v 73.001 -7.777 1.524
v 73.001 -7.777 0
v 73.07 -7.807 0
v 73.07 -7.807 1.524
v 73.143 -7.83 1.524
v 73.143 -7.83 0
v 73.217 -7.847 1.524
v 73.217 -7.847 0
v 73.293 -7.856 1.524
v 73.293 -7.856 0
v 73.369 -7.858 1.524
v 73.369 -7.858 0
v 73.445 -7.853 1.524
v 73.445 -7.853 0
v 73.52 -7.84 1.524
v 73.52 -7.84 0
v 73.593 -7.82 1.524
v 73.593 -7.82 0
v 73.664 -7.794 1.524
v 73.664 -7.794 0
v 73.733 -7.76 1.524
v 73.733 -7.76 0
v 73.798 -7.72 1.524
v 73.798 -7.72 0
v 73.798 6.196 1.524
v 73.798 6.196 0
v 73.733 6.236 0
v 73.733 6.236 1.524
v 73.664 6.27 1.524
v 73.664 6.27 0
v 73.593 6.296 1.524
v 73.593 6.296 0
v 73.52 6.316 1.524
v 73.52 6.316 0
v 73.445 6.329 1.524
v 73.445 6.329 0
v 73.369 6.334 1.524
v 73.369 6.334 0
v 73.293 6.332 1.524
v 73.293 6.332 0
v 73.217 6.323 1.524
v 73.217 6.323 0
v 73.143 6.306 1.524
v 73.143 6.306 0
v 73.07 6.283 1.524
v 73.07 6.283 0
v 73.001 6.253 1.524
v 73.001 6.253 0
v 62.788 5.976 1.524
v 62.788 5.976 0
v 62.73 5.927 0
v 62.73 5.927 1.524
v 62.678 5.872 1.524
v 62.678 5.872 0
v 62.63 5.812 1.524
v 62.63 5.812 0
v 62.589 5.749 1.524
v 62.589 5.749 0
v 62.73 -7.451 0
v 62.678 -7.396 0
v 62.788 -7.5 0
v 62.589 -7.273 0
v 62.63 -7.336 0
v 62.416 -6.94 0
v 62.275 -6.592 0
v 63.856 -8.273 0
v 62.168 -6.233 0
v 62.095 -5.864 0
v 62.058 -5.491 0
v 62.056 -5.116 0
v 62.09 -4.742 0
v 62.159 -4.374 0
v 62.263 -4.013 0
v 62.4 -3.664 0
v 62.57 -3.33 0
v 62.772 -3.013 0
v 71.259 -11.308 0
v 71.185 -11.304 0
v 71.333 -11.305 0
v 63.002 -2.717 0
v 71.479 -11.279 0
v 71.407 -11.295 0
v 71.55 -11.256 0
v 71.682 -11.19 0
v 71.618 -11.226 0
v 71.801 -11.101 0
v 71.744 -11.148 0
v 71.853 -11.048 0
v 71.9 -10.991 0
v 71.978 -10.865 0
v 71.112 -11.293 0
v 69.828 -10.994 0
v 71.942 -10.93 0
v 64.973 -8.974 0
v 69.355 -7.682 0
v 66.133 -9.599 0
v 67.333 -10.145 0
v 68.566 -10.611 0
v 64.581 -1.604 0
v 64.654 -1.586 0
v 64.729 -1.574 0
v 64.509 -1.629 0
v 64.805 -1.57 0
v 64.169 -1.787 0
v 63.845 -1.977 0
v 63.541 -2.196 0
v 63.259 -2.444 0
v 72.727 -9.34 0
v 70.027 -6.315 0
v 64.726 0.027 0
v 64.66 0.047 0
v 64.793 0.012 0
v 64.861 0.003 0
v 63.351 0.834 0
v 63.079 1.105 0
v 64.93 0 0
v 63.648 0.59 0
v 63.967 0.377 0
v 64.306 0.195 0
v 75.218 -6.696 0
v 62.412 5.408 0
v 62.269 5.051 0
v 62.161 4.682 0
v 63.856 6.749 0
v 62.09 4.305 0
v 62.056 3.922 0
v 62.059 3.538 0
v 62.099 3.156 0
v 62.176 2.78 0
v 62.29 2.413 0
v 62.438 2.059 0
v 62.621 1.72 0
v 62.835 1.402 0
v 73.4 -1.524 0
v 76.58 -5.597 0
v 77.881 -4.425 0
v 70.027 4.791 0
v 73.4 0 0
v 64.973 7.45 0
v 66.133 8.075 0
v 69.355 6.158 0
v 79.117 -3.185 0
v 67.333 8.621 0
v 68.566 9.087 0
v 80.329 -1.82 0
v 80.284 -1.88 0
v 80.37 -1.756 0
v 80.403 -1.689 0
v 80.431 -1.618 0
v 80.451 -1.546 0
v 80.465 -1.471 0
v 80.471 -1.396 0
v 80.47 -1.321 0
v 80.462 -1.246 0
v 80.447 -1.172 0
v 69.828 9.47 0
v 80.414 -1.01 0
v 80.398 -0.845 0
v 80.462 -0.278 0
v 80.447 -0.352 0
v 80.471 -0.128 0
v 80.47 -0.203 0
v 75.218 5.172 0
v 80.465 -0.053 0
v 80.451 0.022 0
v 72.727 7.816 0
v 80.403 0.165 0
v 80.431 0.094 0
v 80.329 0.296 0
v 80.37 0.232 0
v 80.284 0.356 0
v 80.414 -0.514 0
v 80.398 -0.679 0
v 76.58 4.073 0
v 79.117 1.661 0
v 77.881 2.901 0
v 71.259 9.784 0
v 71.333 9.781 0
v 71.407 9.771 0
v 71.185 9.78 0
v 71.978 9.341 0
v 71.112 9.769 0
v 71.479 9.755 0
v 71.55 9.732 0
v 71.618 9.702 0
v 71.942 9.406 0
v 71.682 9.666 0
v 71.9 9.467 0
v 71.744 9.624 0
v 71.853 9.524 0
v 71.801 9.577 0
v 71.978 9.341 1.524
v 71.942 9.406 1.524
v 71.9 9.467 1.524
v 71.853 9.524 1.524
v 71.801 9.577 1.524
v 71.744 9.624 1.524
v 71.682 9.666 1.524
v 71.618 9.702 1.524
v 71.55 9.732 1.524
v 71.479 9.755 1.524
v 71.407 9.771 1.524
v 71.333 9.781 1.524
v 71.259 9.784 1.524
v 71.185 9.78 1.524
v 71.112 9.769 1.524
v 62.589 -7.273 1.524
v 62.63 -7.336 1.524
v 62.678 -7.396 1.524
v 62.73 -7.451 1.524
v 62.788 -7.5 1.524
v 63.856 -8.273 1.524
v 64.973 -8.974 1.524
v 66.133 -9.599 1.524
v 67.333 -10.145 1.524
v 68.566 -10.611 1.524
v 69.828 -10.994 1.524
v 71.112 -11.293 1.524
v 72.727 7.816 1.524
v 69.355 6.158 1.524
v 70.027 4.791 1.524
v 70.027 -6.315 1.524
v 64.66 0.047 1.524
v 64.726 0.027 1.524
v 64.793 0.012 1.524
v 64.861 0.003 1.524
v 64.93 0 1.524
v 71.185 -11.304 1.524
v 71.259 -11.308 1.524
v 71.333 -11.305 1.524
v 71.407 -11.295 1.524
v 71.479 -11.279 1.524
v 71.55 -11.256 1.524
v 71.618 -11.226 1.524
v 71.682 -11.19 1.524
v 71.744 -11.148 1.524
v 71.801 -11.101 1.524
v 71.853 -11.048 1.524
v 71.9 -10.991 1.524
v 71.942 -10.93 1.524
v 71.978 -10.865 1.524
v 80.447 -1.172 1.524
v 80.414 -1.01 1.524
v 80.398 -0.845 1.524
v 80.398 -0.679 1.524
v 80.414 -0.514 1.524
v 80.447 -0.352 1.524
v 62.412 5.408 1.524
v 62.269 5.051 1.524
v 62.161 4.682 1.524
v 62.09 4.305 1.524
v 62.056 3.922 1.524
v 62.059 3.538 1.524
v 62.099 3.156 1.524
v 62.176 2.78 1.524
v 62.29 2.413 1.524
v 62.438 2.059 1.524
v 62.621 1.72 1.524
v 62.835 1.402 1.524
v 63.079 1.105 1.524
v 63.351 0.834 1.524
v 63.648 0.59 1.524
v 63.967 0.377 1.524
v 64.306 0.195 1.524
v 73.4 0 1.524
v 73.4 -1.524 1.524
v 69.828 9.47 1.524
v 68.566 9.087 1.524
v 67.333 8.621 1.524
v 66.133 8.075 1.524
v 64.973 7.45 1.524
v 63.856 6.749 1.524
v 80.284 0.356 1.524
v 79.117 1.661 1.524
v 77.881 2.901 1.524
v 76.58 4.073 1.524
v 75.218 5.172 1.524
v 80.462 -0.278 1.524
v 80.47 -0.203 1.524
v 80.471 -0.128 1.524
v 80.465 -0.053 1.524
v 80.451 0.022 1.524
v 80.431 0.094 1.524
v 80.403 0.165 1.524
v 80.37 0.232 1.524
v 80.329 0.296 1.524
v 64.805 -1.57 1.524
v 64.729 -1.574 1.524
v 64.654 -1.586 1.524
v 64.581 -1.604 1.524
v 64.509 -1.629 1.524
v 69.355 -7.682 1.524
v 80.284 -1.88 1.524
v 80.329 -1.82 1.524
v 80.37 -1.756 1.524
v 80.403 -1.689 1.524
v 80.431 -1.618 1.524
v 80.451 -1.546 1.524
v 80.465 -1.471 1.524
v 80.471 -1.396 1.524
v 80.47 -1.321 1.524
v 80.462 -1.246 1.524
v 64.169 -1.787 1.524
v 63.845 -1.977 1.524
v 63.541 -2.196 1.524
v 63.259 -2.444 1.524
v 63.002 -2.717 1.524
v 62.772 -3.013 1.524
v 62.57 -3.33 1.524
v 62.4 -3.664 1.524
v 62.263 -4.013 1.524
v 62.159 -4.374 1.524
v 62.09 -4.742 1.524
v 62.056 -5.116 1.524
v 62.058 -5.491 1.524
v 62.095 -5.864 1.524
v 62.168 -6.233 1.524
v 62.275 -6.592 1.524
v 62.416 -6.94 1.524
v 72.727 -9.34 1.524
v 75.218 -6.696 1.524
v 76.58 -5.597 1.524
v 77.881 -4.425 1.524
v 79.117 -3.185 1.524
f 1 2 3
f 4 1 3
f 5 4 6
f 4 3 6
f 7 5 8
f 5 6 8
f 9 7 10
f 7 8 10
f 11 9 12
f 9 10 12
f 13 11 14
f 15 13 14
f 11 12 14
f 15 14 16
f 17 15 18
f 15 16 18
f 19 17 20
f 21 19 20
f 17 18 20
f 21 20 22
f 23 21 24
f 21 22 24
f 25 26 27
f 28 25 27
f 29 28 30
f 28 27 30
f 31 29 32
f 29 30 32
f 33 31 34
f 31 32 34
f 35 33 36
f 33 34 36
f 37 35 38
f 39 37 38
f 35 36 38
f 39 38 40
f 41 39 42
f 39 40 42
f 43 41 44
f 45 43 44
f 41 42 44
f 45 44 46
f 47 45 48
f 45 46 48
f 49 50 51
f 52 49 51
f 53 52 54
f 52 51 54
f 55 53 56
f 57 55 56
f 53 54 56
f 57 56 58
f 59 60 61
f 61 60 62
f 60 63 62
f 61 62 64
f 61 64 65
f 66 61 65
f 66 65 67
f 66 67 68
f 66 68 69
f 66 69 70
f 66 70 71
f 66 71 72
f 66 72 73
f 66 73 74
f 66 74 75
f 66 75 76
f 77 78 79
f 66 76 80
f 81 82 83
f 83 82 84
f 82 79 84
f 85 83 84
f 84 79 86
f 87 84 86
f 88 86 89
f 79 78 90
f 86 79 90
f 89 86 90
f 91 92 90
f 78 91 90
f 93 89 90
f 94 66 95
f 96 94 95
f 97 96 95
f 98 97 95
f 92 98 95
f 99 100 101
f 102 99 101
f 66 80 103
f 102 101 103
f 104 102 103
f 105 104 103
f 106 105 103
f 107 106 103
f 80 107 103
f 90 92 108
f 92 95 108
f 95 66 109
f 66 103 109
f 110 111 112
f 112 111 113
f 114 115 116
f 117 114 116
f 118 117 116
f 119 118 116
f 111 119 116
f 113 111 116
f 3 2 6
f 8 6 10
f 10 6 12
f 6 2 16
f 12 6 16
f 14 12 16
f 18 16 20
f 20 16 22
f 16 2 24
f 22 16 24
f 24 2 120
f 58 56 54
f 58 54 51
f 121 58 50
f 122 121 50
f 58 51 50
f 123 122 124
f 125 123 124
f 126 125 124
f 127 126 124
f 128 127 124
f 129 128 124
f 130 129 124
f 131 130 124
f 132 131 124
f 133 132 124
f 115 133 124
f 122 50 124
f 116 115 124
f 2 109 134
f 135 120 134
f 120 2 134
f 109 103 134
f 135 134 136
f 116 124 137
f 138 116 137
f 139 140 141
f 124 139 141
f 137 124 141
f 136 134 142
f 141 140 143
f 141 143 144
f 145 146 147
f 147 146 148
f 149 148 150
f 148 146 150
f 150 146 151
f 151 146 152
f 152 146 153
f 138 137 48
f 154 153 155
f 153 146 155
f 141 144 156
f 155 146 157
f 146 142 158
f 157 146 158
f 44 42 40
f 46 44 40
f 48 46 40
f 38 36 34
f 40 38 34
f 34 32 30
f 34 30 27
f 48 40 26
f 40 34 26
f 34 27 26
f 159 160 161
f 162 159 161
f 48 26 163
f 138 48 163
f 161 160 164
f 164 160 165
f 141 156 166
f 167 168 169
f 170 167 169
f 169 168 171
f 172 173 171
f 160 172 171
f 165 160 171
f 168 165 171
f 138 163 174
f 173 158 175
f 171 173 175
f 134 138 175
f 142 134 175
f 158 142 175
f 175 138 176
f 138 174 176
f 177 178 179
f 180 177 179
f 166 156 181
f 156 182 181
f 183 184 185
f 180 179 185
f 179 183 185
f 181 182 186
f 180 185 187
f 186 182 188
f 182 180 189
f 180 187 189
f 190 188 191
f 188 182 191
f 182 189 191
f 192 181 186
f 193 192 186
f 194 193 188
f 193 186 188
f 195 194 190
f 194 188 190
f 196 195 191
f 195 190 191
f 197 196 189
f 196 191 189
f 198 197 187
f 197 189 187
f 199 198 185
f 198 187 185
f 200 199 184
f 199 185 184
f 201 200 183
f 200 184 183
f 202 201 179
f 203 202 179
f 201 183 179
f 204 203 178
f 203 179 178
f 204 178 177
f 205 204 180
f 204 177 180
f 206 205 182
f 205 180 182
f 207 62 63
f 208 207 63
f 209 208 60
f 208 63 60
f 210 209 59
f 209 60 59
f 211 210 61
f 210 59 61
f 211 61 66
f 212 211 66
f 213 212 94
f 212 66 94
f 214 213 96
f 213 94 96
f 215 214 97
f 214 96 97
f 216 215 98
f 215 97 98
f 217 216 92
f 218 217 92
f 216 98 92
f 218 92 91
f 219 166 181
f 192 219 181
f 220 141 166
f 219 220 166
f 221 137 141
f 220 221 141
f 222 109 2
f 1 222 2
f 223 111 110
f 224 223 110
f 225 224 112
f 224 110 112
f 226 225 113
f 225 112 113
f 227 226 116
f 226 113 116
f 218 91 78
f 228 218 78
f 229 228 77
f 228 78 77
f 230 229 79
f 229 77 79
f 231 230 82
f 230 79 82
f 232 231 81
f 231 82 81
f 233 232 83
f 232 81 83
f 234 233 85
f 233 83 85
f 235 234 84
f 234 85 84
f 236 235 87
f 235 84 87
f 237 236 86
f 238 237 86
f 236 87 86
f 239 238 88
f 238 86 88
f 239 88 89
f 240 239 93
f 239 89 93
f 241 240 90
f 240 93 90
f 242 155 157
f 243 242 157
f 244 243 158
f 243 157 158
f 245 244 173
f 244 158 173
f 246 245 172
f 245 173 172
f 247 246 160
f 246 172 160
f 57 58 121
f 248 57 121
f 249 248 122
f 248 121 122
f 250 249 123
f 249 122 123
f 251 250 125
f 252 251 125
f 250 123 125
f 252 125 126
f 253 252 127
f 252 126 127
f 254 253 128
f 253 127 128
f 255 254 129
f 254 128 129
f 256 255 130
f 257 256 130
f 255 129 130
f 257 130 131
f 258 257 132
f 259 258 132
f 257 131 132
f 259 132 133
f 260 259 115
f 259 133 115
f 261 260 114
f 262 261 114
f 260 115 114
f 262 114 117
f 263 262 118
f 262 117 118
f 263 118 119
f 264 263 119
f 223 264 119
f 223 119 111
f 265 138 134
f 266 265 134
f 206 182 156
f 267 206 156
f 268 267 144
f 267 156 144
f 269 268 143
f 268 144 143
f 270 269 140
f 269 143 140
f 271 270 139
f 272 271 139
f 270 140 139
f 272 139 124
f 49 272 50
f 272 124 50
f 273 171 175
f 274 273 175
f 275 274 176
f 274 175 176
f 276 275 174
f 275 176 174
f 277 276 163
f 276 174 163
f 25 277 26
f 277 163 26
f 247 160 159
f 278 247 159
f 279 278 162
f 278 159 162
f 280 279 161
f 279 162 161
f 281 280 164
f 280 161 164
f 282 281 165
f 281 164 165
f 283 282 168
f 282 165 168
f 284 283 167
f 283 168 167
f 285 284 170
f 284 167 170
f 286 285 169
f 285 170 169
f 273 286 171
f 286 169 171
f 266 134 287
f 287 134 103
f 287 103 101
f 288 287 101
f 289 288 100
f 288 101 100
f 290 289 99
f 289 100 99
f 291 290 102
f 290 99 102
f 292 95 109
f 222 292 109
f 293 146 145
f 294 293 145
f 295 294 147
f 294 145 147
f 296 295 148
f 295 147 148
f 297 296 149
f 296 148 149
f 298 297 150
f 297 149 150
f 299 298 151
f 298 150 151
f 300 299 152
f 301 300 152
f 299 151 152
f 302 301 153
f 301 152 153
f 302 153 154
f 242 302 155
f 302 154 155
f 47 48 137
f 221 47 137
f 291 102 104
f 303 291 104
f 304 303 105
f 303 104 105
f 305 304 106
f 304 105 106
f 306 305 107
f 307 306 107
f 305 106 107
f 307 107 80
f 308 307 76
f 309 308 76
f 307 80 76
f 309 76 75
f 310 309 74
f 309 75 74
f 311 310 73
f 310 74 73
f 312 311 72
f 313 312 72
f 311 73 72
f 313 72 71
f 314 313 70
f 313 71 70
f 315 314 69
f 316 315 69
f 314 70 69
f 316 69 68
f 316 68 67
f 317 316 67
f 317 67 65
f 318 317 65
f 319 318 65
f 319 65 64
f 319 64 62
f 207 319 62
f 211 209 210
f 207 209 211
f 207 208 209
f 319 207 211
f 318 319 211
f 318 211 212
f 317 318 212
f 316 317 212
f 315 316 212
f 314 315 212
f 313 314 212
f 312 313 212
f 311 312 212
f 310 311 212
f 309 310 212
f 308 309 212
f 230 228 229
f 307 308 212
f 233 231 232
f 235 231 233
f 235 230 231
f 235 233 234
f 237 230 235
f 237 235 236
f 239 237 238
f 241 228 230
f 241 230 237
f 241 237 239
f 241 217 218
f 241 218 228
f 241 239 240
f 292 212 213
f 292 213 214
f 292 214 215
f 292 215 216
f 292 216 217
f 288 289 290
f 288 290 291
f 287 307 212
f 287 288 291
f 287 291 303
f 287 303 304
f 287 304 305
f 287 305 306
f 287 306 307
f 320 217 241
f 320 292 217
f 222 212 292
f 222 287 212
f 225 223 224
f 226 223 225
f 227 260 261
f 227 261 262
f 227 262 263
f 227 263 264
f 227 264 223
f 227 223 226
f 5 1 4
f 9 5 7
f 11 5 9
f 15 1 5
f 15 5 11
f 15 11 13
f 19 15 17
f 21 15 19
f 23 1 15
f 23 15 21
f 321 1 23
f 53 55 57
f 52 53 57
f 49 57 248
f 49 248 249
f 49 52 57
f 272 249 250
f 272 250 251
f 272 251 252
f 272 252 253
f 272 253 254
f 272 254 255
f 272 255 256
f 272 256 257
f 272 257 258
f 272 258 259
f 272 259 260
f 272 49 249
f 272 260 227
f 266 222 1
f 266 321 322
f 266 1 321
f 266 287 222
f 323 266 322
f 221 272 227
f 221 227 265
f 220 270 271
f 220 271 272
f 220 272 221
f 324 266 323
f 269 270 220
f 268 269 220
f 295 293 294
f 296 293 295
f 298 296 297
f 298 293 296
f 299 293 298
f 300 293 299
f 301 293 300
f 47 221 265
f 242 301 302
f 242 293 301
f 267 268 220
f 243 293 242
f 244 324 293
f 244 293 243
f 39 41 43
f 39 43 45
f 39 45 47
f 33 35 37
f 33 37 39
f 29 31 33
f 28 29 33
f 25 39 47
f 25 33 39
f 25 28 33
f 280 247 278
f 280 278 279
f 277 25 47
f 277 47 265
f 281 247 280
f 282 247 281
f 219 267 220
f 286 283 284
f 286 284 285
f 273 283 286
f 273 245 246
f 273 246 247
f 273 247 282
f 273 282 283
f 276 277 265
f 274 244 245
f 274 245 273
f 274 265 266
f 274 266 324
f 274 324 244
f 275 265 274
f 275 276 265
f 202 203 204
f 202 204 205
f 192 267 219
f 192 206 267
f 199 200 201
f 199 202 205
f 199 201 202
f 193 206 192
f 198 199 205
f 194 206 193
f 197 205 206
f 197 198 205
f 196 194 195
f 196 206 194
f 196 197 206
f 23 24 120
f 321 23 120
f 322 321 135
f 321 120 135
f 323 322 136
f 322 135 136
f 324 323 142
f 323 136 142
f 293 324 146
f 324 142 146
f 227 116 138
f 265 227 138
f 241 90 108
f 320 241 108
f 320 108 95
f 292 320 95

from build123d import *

# Parameters (mm, degrees)
BOSS_EXTRUDE1_DEPTH = 1.524


with BuildPart() as part:
    # Sketch1 → Boss-Extrude1 (new body)
    with BuildSketch(Plane.XY):
        with BuildLine():
            Line((73.000643508, 6.252619957), (70.027285358, 4.79070184))
            Line((70.027285358, 4.79070184), (69.354858347, 6.15833407))
            Line((69.354858347, 6.15833407), (72.727332666, 7.816486587))
            Line((72.727332666, 7.816486587), (71.978000913, 9.340533419))
            ThreePointArc((71.978000913, 9.340533419), (71.617545508, 9.701815407), (71.111637054, 9.768967549))
            ThreePointArc((71.111637054, 9.768967549), (66.728733529, 8.358005389), (62.788250891, 5.976146011))
            ThreePointArc((62.788250891, 5.976146011), (62.67763825, 5.871916038), (62.588919113, 5.748514423))
            ThreePointArc((62.588919113, 5.748514423), (62.289639081, 2.412826115), (64.660279583, 0.047144684))
            ThreePointArc((64.660279583, 0.047144684), (64.792973258, 0.011875), (64.929759758, 0))
            Line((64.929759758, 0), (73.399759676, 0))
            Line((73.399759676, 0), (73.399759676, -1.524))
            Line((73.399759676, -1.524), (64.804850415, -1.570364804))
            ThreePointArc((64.804850415, -1.570364804), (64.654260243, -1.585608721), (64.509301597, -1.629160622))
            ThreePointArc((64.509301597, -1.629160622), (62.262802552, -4.01311856), (62.588919113, -7.272514424))
            ThreePointArc((62.588919113, -7.272514424), (62.67763825, -7.395916038), (62.788250891, -7.500146011))
            ThreePointArc((62.788250891, -7.500146011), (66.728733529, -9.882005389), (71.111637054, -11.292967549))
            ThreePointArc((71.111637054, -11.292967549), (71.617545508, -11.225815407), (71.978000913, -10.864533419))
            Line((71.978000913, -10.864533419), (72.727332666, -9.340486587))
            Line((72.727332666, -9.340486587), (69.354858347, -7.68233407))
            Line((69.354858347, -7.68233407), (70.027285358, -6.31470184))
            Line((70.027285358, -6.31470184), (73.000643508, -7.776619957))
            ThreePointArc((73.000643508, -7.776619957), (73.406672693, -7.856097248), (73.797539642, -7.720452982))
            ThreePointArc((73.797539642, -7.720452982), (77.23855889, -5.019988283), (80.283555852, -1.879746802))
            ThreePointArc((80.283555852, -1.879746802), (80.451041219, -1.545581778), (80.447017019, -1.17181525))
            ThreePointArc((80.447017019, -1.17181525), (80.395843158, -0.762), (80.447017019, -0.35218475))
            ThreePointArc((80.447017019, -0.35218475), (80.451041219, 0.021581778), (80.283555852, 0.355746802))
            ThreePointArc((80.283555852, 0.355746802), (77.23855889, 3.495988283), (73.797539642, 6.196452982))
            ThreePointArc((73.797539642, 6.196452982), (73.406672693, 6.332097248), (73.000643508, 6.252619957))
        make_face()
    extrude(amount=BOSS_EXTRUDE1_DEPTH)


solid = part.part
